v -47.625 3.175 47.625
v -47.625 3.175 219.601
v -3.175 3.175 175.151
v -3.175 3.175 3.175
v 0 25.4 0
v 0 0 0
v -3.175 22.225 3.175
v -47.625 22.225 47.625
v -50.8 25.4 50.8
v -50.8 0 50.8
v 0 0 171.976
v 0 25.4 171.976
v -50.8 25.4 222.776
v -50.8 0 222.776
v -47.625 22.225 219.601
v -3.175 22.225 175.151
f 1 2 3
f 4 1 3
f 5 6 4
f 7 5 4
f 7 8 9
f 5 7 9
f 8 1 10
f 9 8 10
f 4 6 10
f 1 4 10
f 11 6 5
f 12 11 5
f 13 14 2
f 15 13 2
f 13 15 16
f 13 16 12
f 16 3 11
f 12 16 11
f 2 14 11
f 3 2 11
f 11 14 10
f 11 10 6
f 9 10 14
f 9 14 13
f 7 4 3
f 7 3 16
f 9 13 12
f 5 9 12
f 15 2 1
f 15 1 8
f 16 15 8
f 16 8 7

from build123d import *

# Parameters (mm, degrees)
F0_W     = 50.8
F0_H     = 25.4
F0_W_2   = 44.45
F0_H_2   = 19.05
F1_DEPTH = 222.77578
F3_DEPTH = 25.4


with BuildPart() as f1:
    # F0 (on Top) → F1 (new body)
    with BuildSketch(Plane.XY):
        with Locations((-25.4, 12.7)):
            Rectangle(F0_W, F0_H)
        with Locations((-25.4, 12.7)):
            Rectangle(F0_W_2, F0_H_2, mode=Mode.SUBTRACT)
    extrude(amount=F1_DEPTH)

    # F2 (on face) → F3 (cut)
    with BuildSketch(Plane.XZ):
        Polygon((-50.8, 0), (0, 0), (-50.8, 50.8), align=None)
        Polygon((-50.8, 222.77578), (0, 171.97578), (0, 222.77578), align=None)
    extrude(amount=-F3_DEPTH, mode=Mode.SUBTRACT)


solid = f1.part
